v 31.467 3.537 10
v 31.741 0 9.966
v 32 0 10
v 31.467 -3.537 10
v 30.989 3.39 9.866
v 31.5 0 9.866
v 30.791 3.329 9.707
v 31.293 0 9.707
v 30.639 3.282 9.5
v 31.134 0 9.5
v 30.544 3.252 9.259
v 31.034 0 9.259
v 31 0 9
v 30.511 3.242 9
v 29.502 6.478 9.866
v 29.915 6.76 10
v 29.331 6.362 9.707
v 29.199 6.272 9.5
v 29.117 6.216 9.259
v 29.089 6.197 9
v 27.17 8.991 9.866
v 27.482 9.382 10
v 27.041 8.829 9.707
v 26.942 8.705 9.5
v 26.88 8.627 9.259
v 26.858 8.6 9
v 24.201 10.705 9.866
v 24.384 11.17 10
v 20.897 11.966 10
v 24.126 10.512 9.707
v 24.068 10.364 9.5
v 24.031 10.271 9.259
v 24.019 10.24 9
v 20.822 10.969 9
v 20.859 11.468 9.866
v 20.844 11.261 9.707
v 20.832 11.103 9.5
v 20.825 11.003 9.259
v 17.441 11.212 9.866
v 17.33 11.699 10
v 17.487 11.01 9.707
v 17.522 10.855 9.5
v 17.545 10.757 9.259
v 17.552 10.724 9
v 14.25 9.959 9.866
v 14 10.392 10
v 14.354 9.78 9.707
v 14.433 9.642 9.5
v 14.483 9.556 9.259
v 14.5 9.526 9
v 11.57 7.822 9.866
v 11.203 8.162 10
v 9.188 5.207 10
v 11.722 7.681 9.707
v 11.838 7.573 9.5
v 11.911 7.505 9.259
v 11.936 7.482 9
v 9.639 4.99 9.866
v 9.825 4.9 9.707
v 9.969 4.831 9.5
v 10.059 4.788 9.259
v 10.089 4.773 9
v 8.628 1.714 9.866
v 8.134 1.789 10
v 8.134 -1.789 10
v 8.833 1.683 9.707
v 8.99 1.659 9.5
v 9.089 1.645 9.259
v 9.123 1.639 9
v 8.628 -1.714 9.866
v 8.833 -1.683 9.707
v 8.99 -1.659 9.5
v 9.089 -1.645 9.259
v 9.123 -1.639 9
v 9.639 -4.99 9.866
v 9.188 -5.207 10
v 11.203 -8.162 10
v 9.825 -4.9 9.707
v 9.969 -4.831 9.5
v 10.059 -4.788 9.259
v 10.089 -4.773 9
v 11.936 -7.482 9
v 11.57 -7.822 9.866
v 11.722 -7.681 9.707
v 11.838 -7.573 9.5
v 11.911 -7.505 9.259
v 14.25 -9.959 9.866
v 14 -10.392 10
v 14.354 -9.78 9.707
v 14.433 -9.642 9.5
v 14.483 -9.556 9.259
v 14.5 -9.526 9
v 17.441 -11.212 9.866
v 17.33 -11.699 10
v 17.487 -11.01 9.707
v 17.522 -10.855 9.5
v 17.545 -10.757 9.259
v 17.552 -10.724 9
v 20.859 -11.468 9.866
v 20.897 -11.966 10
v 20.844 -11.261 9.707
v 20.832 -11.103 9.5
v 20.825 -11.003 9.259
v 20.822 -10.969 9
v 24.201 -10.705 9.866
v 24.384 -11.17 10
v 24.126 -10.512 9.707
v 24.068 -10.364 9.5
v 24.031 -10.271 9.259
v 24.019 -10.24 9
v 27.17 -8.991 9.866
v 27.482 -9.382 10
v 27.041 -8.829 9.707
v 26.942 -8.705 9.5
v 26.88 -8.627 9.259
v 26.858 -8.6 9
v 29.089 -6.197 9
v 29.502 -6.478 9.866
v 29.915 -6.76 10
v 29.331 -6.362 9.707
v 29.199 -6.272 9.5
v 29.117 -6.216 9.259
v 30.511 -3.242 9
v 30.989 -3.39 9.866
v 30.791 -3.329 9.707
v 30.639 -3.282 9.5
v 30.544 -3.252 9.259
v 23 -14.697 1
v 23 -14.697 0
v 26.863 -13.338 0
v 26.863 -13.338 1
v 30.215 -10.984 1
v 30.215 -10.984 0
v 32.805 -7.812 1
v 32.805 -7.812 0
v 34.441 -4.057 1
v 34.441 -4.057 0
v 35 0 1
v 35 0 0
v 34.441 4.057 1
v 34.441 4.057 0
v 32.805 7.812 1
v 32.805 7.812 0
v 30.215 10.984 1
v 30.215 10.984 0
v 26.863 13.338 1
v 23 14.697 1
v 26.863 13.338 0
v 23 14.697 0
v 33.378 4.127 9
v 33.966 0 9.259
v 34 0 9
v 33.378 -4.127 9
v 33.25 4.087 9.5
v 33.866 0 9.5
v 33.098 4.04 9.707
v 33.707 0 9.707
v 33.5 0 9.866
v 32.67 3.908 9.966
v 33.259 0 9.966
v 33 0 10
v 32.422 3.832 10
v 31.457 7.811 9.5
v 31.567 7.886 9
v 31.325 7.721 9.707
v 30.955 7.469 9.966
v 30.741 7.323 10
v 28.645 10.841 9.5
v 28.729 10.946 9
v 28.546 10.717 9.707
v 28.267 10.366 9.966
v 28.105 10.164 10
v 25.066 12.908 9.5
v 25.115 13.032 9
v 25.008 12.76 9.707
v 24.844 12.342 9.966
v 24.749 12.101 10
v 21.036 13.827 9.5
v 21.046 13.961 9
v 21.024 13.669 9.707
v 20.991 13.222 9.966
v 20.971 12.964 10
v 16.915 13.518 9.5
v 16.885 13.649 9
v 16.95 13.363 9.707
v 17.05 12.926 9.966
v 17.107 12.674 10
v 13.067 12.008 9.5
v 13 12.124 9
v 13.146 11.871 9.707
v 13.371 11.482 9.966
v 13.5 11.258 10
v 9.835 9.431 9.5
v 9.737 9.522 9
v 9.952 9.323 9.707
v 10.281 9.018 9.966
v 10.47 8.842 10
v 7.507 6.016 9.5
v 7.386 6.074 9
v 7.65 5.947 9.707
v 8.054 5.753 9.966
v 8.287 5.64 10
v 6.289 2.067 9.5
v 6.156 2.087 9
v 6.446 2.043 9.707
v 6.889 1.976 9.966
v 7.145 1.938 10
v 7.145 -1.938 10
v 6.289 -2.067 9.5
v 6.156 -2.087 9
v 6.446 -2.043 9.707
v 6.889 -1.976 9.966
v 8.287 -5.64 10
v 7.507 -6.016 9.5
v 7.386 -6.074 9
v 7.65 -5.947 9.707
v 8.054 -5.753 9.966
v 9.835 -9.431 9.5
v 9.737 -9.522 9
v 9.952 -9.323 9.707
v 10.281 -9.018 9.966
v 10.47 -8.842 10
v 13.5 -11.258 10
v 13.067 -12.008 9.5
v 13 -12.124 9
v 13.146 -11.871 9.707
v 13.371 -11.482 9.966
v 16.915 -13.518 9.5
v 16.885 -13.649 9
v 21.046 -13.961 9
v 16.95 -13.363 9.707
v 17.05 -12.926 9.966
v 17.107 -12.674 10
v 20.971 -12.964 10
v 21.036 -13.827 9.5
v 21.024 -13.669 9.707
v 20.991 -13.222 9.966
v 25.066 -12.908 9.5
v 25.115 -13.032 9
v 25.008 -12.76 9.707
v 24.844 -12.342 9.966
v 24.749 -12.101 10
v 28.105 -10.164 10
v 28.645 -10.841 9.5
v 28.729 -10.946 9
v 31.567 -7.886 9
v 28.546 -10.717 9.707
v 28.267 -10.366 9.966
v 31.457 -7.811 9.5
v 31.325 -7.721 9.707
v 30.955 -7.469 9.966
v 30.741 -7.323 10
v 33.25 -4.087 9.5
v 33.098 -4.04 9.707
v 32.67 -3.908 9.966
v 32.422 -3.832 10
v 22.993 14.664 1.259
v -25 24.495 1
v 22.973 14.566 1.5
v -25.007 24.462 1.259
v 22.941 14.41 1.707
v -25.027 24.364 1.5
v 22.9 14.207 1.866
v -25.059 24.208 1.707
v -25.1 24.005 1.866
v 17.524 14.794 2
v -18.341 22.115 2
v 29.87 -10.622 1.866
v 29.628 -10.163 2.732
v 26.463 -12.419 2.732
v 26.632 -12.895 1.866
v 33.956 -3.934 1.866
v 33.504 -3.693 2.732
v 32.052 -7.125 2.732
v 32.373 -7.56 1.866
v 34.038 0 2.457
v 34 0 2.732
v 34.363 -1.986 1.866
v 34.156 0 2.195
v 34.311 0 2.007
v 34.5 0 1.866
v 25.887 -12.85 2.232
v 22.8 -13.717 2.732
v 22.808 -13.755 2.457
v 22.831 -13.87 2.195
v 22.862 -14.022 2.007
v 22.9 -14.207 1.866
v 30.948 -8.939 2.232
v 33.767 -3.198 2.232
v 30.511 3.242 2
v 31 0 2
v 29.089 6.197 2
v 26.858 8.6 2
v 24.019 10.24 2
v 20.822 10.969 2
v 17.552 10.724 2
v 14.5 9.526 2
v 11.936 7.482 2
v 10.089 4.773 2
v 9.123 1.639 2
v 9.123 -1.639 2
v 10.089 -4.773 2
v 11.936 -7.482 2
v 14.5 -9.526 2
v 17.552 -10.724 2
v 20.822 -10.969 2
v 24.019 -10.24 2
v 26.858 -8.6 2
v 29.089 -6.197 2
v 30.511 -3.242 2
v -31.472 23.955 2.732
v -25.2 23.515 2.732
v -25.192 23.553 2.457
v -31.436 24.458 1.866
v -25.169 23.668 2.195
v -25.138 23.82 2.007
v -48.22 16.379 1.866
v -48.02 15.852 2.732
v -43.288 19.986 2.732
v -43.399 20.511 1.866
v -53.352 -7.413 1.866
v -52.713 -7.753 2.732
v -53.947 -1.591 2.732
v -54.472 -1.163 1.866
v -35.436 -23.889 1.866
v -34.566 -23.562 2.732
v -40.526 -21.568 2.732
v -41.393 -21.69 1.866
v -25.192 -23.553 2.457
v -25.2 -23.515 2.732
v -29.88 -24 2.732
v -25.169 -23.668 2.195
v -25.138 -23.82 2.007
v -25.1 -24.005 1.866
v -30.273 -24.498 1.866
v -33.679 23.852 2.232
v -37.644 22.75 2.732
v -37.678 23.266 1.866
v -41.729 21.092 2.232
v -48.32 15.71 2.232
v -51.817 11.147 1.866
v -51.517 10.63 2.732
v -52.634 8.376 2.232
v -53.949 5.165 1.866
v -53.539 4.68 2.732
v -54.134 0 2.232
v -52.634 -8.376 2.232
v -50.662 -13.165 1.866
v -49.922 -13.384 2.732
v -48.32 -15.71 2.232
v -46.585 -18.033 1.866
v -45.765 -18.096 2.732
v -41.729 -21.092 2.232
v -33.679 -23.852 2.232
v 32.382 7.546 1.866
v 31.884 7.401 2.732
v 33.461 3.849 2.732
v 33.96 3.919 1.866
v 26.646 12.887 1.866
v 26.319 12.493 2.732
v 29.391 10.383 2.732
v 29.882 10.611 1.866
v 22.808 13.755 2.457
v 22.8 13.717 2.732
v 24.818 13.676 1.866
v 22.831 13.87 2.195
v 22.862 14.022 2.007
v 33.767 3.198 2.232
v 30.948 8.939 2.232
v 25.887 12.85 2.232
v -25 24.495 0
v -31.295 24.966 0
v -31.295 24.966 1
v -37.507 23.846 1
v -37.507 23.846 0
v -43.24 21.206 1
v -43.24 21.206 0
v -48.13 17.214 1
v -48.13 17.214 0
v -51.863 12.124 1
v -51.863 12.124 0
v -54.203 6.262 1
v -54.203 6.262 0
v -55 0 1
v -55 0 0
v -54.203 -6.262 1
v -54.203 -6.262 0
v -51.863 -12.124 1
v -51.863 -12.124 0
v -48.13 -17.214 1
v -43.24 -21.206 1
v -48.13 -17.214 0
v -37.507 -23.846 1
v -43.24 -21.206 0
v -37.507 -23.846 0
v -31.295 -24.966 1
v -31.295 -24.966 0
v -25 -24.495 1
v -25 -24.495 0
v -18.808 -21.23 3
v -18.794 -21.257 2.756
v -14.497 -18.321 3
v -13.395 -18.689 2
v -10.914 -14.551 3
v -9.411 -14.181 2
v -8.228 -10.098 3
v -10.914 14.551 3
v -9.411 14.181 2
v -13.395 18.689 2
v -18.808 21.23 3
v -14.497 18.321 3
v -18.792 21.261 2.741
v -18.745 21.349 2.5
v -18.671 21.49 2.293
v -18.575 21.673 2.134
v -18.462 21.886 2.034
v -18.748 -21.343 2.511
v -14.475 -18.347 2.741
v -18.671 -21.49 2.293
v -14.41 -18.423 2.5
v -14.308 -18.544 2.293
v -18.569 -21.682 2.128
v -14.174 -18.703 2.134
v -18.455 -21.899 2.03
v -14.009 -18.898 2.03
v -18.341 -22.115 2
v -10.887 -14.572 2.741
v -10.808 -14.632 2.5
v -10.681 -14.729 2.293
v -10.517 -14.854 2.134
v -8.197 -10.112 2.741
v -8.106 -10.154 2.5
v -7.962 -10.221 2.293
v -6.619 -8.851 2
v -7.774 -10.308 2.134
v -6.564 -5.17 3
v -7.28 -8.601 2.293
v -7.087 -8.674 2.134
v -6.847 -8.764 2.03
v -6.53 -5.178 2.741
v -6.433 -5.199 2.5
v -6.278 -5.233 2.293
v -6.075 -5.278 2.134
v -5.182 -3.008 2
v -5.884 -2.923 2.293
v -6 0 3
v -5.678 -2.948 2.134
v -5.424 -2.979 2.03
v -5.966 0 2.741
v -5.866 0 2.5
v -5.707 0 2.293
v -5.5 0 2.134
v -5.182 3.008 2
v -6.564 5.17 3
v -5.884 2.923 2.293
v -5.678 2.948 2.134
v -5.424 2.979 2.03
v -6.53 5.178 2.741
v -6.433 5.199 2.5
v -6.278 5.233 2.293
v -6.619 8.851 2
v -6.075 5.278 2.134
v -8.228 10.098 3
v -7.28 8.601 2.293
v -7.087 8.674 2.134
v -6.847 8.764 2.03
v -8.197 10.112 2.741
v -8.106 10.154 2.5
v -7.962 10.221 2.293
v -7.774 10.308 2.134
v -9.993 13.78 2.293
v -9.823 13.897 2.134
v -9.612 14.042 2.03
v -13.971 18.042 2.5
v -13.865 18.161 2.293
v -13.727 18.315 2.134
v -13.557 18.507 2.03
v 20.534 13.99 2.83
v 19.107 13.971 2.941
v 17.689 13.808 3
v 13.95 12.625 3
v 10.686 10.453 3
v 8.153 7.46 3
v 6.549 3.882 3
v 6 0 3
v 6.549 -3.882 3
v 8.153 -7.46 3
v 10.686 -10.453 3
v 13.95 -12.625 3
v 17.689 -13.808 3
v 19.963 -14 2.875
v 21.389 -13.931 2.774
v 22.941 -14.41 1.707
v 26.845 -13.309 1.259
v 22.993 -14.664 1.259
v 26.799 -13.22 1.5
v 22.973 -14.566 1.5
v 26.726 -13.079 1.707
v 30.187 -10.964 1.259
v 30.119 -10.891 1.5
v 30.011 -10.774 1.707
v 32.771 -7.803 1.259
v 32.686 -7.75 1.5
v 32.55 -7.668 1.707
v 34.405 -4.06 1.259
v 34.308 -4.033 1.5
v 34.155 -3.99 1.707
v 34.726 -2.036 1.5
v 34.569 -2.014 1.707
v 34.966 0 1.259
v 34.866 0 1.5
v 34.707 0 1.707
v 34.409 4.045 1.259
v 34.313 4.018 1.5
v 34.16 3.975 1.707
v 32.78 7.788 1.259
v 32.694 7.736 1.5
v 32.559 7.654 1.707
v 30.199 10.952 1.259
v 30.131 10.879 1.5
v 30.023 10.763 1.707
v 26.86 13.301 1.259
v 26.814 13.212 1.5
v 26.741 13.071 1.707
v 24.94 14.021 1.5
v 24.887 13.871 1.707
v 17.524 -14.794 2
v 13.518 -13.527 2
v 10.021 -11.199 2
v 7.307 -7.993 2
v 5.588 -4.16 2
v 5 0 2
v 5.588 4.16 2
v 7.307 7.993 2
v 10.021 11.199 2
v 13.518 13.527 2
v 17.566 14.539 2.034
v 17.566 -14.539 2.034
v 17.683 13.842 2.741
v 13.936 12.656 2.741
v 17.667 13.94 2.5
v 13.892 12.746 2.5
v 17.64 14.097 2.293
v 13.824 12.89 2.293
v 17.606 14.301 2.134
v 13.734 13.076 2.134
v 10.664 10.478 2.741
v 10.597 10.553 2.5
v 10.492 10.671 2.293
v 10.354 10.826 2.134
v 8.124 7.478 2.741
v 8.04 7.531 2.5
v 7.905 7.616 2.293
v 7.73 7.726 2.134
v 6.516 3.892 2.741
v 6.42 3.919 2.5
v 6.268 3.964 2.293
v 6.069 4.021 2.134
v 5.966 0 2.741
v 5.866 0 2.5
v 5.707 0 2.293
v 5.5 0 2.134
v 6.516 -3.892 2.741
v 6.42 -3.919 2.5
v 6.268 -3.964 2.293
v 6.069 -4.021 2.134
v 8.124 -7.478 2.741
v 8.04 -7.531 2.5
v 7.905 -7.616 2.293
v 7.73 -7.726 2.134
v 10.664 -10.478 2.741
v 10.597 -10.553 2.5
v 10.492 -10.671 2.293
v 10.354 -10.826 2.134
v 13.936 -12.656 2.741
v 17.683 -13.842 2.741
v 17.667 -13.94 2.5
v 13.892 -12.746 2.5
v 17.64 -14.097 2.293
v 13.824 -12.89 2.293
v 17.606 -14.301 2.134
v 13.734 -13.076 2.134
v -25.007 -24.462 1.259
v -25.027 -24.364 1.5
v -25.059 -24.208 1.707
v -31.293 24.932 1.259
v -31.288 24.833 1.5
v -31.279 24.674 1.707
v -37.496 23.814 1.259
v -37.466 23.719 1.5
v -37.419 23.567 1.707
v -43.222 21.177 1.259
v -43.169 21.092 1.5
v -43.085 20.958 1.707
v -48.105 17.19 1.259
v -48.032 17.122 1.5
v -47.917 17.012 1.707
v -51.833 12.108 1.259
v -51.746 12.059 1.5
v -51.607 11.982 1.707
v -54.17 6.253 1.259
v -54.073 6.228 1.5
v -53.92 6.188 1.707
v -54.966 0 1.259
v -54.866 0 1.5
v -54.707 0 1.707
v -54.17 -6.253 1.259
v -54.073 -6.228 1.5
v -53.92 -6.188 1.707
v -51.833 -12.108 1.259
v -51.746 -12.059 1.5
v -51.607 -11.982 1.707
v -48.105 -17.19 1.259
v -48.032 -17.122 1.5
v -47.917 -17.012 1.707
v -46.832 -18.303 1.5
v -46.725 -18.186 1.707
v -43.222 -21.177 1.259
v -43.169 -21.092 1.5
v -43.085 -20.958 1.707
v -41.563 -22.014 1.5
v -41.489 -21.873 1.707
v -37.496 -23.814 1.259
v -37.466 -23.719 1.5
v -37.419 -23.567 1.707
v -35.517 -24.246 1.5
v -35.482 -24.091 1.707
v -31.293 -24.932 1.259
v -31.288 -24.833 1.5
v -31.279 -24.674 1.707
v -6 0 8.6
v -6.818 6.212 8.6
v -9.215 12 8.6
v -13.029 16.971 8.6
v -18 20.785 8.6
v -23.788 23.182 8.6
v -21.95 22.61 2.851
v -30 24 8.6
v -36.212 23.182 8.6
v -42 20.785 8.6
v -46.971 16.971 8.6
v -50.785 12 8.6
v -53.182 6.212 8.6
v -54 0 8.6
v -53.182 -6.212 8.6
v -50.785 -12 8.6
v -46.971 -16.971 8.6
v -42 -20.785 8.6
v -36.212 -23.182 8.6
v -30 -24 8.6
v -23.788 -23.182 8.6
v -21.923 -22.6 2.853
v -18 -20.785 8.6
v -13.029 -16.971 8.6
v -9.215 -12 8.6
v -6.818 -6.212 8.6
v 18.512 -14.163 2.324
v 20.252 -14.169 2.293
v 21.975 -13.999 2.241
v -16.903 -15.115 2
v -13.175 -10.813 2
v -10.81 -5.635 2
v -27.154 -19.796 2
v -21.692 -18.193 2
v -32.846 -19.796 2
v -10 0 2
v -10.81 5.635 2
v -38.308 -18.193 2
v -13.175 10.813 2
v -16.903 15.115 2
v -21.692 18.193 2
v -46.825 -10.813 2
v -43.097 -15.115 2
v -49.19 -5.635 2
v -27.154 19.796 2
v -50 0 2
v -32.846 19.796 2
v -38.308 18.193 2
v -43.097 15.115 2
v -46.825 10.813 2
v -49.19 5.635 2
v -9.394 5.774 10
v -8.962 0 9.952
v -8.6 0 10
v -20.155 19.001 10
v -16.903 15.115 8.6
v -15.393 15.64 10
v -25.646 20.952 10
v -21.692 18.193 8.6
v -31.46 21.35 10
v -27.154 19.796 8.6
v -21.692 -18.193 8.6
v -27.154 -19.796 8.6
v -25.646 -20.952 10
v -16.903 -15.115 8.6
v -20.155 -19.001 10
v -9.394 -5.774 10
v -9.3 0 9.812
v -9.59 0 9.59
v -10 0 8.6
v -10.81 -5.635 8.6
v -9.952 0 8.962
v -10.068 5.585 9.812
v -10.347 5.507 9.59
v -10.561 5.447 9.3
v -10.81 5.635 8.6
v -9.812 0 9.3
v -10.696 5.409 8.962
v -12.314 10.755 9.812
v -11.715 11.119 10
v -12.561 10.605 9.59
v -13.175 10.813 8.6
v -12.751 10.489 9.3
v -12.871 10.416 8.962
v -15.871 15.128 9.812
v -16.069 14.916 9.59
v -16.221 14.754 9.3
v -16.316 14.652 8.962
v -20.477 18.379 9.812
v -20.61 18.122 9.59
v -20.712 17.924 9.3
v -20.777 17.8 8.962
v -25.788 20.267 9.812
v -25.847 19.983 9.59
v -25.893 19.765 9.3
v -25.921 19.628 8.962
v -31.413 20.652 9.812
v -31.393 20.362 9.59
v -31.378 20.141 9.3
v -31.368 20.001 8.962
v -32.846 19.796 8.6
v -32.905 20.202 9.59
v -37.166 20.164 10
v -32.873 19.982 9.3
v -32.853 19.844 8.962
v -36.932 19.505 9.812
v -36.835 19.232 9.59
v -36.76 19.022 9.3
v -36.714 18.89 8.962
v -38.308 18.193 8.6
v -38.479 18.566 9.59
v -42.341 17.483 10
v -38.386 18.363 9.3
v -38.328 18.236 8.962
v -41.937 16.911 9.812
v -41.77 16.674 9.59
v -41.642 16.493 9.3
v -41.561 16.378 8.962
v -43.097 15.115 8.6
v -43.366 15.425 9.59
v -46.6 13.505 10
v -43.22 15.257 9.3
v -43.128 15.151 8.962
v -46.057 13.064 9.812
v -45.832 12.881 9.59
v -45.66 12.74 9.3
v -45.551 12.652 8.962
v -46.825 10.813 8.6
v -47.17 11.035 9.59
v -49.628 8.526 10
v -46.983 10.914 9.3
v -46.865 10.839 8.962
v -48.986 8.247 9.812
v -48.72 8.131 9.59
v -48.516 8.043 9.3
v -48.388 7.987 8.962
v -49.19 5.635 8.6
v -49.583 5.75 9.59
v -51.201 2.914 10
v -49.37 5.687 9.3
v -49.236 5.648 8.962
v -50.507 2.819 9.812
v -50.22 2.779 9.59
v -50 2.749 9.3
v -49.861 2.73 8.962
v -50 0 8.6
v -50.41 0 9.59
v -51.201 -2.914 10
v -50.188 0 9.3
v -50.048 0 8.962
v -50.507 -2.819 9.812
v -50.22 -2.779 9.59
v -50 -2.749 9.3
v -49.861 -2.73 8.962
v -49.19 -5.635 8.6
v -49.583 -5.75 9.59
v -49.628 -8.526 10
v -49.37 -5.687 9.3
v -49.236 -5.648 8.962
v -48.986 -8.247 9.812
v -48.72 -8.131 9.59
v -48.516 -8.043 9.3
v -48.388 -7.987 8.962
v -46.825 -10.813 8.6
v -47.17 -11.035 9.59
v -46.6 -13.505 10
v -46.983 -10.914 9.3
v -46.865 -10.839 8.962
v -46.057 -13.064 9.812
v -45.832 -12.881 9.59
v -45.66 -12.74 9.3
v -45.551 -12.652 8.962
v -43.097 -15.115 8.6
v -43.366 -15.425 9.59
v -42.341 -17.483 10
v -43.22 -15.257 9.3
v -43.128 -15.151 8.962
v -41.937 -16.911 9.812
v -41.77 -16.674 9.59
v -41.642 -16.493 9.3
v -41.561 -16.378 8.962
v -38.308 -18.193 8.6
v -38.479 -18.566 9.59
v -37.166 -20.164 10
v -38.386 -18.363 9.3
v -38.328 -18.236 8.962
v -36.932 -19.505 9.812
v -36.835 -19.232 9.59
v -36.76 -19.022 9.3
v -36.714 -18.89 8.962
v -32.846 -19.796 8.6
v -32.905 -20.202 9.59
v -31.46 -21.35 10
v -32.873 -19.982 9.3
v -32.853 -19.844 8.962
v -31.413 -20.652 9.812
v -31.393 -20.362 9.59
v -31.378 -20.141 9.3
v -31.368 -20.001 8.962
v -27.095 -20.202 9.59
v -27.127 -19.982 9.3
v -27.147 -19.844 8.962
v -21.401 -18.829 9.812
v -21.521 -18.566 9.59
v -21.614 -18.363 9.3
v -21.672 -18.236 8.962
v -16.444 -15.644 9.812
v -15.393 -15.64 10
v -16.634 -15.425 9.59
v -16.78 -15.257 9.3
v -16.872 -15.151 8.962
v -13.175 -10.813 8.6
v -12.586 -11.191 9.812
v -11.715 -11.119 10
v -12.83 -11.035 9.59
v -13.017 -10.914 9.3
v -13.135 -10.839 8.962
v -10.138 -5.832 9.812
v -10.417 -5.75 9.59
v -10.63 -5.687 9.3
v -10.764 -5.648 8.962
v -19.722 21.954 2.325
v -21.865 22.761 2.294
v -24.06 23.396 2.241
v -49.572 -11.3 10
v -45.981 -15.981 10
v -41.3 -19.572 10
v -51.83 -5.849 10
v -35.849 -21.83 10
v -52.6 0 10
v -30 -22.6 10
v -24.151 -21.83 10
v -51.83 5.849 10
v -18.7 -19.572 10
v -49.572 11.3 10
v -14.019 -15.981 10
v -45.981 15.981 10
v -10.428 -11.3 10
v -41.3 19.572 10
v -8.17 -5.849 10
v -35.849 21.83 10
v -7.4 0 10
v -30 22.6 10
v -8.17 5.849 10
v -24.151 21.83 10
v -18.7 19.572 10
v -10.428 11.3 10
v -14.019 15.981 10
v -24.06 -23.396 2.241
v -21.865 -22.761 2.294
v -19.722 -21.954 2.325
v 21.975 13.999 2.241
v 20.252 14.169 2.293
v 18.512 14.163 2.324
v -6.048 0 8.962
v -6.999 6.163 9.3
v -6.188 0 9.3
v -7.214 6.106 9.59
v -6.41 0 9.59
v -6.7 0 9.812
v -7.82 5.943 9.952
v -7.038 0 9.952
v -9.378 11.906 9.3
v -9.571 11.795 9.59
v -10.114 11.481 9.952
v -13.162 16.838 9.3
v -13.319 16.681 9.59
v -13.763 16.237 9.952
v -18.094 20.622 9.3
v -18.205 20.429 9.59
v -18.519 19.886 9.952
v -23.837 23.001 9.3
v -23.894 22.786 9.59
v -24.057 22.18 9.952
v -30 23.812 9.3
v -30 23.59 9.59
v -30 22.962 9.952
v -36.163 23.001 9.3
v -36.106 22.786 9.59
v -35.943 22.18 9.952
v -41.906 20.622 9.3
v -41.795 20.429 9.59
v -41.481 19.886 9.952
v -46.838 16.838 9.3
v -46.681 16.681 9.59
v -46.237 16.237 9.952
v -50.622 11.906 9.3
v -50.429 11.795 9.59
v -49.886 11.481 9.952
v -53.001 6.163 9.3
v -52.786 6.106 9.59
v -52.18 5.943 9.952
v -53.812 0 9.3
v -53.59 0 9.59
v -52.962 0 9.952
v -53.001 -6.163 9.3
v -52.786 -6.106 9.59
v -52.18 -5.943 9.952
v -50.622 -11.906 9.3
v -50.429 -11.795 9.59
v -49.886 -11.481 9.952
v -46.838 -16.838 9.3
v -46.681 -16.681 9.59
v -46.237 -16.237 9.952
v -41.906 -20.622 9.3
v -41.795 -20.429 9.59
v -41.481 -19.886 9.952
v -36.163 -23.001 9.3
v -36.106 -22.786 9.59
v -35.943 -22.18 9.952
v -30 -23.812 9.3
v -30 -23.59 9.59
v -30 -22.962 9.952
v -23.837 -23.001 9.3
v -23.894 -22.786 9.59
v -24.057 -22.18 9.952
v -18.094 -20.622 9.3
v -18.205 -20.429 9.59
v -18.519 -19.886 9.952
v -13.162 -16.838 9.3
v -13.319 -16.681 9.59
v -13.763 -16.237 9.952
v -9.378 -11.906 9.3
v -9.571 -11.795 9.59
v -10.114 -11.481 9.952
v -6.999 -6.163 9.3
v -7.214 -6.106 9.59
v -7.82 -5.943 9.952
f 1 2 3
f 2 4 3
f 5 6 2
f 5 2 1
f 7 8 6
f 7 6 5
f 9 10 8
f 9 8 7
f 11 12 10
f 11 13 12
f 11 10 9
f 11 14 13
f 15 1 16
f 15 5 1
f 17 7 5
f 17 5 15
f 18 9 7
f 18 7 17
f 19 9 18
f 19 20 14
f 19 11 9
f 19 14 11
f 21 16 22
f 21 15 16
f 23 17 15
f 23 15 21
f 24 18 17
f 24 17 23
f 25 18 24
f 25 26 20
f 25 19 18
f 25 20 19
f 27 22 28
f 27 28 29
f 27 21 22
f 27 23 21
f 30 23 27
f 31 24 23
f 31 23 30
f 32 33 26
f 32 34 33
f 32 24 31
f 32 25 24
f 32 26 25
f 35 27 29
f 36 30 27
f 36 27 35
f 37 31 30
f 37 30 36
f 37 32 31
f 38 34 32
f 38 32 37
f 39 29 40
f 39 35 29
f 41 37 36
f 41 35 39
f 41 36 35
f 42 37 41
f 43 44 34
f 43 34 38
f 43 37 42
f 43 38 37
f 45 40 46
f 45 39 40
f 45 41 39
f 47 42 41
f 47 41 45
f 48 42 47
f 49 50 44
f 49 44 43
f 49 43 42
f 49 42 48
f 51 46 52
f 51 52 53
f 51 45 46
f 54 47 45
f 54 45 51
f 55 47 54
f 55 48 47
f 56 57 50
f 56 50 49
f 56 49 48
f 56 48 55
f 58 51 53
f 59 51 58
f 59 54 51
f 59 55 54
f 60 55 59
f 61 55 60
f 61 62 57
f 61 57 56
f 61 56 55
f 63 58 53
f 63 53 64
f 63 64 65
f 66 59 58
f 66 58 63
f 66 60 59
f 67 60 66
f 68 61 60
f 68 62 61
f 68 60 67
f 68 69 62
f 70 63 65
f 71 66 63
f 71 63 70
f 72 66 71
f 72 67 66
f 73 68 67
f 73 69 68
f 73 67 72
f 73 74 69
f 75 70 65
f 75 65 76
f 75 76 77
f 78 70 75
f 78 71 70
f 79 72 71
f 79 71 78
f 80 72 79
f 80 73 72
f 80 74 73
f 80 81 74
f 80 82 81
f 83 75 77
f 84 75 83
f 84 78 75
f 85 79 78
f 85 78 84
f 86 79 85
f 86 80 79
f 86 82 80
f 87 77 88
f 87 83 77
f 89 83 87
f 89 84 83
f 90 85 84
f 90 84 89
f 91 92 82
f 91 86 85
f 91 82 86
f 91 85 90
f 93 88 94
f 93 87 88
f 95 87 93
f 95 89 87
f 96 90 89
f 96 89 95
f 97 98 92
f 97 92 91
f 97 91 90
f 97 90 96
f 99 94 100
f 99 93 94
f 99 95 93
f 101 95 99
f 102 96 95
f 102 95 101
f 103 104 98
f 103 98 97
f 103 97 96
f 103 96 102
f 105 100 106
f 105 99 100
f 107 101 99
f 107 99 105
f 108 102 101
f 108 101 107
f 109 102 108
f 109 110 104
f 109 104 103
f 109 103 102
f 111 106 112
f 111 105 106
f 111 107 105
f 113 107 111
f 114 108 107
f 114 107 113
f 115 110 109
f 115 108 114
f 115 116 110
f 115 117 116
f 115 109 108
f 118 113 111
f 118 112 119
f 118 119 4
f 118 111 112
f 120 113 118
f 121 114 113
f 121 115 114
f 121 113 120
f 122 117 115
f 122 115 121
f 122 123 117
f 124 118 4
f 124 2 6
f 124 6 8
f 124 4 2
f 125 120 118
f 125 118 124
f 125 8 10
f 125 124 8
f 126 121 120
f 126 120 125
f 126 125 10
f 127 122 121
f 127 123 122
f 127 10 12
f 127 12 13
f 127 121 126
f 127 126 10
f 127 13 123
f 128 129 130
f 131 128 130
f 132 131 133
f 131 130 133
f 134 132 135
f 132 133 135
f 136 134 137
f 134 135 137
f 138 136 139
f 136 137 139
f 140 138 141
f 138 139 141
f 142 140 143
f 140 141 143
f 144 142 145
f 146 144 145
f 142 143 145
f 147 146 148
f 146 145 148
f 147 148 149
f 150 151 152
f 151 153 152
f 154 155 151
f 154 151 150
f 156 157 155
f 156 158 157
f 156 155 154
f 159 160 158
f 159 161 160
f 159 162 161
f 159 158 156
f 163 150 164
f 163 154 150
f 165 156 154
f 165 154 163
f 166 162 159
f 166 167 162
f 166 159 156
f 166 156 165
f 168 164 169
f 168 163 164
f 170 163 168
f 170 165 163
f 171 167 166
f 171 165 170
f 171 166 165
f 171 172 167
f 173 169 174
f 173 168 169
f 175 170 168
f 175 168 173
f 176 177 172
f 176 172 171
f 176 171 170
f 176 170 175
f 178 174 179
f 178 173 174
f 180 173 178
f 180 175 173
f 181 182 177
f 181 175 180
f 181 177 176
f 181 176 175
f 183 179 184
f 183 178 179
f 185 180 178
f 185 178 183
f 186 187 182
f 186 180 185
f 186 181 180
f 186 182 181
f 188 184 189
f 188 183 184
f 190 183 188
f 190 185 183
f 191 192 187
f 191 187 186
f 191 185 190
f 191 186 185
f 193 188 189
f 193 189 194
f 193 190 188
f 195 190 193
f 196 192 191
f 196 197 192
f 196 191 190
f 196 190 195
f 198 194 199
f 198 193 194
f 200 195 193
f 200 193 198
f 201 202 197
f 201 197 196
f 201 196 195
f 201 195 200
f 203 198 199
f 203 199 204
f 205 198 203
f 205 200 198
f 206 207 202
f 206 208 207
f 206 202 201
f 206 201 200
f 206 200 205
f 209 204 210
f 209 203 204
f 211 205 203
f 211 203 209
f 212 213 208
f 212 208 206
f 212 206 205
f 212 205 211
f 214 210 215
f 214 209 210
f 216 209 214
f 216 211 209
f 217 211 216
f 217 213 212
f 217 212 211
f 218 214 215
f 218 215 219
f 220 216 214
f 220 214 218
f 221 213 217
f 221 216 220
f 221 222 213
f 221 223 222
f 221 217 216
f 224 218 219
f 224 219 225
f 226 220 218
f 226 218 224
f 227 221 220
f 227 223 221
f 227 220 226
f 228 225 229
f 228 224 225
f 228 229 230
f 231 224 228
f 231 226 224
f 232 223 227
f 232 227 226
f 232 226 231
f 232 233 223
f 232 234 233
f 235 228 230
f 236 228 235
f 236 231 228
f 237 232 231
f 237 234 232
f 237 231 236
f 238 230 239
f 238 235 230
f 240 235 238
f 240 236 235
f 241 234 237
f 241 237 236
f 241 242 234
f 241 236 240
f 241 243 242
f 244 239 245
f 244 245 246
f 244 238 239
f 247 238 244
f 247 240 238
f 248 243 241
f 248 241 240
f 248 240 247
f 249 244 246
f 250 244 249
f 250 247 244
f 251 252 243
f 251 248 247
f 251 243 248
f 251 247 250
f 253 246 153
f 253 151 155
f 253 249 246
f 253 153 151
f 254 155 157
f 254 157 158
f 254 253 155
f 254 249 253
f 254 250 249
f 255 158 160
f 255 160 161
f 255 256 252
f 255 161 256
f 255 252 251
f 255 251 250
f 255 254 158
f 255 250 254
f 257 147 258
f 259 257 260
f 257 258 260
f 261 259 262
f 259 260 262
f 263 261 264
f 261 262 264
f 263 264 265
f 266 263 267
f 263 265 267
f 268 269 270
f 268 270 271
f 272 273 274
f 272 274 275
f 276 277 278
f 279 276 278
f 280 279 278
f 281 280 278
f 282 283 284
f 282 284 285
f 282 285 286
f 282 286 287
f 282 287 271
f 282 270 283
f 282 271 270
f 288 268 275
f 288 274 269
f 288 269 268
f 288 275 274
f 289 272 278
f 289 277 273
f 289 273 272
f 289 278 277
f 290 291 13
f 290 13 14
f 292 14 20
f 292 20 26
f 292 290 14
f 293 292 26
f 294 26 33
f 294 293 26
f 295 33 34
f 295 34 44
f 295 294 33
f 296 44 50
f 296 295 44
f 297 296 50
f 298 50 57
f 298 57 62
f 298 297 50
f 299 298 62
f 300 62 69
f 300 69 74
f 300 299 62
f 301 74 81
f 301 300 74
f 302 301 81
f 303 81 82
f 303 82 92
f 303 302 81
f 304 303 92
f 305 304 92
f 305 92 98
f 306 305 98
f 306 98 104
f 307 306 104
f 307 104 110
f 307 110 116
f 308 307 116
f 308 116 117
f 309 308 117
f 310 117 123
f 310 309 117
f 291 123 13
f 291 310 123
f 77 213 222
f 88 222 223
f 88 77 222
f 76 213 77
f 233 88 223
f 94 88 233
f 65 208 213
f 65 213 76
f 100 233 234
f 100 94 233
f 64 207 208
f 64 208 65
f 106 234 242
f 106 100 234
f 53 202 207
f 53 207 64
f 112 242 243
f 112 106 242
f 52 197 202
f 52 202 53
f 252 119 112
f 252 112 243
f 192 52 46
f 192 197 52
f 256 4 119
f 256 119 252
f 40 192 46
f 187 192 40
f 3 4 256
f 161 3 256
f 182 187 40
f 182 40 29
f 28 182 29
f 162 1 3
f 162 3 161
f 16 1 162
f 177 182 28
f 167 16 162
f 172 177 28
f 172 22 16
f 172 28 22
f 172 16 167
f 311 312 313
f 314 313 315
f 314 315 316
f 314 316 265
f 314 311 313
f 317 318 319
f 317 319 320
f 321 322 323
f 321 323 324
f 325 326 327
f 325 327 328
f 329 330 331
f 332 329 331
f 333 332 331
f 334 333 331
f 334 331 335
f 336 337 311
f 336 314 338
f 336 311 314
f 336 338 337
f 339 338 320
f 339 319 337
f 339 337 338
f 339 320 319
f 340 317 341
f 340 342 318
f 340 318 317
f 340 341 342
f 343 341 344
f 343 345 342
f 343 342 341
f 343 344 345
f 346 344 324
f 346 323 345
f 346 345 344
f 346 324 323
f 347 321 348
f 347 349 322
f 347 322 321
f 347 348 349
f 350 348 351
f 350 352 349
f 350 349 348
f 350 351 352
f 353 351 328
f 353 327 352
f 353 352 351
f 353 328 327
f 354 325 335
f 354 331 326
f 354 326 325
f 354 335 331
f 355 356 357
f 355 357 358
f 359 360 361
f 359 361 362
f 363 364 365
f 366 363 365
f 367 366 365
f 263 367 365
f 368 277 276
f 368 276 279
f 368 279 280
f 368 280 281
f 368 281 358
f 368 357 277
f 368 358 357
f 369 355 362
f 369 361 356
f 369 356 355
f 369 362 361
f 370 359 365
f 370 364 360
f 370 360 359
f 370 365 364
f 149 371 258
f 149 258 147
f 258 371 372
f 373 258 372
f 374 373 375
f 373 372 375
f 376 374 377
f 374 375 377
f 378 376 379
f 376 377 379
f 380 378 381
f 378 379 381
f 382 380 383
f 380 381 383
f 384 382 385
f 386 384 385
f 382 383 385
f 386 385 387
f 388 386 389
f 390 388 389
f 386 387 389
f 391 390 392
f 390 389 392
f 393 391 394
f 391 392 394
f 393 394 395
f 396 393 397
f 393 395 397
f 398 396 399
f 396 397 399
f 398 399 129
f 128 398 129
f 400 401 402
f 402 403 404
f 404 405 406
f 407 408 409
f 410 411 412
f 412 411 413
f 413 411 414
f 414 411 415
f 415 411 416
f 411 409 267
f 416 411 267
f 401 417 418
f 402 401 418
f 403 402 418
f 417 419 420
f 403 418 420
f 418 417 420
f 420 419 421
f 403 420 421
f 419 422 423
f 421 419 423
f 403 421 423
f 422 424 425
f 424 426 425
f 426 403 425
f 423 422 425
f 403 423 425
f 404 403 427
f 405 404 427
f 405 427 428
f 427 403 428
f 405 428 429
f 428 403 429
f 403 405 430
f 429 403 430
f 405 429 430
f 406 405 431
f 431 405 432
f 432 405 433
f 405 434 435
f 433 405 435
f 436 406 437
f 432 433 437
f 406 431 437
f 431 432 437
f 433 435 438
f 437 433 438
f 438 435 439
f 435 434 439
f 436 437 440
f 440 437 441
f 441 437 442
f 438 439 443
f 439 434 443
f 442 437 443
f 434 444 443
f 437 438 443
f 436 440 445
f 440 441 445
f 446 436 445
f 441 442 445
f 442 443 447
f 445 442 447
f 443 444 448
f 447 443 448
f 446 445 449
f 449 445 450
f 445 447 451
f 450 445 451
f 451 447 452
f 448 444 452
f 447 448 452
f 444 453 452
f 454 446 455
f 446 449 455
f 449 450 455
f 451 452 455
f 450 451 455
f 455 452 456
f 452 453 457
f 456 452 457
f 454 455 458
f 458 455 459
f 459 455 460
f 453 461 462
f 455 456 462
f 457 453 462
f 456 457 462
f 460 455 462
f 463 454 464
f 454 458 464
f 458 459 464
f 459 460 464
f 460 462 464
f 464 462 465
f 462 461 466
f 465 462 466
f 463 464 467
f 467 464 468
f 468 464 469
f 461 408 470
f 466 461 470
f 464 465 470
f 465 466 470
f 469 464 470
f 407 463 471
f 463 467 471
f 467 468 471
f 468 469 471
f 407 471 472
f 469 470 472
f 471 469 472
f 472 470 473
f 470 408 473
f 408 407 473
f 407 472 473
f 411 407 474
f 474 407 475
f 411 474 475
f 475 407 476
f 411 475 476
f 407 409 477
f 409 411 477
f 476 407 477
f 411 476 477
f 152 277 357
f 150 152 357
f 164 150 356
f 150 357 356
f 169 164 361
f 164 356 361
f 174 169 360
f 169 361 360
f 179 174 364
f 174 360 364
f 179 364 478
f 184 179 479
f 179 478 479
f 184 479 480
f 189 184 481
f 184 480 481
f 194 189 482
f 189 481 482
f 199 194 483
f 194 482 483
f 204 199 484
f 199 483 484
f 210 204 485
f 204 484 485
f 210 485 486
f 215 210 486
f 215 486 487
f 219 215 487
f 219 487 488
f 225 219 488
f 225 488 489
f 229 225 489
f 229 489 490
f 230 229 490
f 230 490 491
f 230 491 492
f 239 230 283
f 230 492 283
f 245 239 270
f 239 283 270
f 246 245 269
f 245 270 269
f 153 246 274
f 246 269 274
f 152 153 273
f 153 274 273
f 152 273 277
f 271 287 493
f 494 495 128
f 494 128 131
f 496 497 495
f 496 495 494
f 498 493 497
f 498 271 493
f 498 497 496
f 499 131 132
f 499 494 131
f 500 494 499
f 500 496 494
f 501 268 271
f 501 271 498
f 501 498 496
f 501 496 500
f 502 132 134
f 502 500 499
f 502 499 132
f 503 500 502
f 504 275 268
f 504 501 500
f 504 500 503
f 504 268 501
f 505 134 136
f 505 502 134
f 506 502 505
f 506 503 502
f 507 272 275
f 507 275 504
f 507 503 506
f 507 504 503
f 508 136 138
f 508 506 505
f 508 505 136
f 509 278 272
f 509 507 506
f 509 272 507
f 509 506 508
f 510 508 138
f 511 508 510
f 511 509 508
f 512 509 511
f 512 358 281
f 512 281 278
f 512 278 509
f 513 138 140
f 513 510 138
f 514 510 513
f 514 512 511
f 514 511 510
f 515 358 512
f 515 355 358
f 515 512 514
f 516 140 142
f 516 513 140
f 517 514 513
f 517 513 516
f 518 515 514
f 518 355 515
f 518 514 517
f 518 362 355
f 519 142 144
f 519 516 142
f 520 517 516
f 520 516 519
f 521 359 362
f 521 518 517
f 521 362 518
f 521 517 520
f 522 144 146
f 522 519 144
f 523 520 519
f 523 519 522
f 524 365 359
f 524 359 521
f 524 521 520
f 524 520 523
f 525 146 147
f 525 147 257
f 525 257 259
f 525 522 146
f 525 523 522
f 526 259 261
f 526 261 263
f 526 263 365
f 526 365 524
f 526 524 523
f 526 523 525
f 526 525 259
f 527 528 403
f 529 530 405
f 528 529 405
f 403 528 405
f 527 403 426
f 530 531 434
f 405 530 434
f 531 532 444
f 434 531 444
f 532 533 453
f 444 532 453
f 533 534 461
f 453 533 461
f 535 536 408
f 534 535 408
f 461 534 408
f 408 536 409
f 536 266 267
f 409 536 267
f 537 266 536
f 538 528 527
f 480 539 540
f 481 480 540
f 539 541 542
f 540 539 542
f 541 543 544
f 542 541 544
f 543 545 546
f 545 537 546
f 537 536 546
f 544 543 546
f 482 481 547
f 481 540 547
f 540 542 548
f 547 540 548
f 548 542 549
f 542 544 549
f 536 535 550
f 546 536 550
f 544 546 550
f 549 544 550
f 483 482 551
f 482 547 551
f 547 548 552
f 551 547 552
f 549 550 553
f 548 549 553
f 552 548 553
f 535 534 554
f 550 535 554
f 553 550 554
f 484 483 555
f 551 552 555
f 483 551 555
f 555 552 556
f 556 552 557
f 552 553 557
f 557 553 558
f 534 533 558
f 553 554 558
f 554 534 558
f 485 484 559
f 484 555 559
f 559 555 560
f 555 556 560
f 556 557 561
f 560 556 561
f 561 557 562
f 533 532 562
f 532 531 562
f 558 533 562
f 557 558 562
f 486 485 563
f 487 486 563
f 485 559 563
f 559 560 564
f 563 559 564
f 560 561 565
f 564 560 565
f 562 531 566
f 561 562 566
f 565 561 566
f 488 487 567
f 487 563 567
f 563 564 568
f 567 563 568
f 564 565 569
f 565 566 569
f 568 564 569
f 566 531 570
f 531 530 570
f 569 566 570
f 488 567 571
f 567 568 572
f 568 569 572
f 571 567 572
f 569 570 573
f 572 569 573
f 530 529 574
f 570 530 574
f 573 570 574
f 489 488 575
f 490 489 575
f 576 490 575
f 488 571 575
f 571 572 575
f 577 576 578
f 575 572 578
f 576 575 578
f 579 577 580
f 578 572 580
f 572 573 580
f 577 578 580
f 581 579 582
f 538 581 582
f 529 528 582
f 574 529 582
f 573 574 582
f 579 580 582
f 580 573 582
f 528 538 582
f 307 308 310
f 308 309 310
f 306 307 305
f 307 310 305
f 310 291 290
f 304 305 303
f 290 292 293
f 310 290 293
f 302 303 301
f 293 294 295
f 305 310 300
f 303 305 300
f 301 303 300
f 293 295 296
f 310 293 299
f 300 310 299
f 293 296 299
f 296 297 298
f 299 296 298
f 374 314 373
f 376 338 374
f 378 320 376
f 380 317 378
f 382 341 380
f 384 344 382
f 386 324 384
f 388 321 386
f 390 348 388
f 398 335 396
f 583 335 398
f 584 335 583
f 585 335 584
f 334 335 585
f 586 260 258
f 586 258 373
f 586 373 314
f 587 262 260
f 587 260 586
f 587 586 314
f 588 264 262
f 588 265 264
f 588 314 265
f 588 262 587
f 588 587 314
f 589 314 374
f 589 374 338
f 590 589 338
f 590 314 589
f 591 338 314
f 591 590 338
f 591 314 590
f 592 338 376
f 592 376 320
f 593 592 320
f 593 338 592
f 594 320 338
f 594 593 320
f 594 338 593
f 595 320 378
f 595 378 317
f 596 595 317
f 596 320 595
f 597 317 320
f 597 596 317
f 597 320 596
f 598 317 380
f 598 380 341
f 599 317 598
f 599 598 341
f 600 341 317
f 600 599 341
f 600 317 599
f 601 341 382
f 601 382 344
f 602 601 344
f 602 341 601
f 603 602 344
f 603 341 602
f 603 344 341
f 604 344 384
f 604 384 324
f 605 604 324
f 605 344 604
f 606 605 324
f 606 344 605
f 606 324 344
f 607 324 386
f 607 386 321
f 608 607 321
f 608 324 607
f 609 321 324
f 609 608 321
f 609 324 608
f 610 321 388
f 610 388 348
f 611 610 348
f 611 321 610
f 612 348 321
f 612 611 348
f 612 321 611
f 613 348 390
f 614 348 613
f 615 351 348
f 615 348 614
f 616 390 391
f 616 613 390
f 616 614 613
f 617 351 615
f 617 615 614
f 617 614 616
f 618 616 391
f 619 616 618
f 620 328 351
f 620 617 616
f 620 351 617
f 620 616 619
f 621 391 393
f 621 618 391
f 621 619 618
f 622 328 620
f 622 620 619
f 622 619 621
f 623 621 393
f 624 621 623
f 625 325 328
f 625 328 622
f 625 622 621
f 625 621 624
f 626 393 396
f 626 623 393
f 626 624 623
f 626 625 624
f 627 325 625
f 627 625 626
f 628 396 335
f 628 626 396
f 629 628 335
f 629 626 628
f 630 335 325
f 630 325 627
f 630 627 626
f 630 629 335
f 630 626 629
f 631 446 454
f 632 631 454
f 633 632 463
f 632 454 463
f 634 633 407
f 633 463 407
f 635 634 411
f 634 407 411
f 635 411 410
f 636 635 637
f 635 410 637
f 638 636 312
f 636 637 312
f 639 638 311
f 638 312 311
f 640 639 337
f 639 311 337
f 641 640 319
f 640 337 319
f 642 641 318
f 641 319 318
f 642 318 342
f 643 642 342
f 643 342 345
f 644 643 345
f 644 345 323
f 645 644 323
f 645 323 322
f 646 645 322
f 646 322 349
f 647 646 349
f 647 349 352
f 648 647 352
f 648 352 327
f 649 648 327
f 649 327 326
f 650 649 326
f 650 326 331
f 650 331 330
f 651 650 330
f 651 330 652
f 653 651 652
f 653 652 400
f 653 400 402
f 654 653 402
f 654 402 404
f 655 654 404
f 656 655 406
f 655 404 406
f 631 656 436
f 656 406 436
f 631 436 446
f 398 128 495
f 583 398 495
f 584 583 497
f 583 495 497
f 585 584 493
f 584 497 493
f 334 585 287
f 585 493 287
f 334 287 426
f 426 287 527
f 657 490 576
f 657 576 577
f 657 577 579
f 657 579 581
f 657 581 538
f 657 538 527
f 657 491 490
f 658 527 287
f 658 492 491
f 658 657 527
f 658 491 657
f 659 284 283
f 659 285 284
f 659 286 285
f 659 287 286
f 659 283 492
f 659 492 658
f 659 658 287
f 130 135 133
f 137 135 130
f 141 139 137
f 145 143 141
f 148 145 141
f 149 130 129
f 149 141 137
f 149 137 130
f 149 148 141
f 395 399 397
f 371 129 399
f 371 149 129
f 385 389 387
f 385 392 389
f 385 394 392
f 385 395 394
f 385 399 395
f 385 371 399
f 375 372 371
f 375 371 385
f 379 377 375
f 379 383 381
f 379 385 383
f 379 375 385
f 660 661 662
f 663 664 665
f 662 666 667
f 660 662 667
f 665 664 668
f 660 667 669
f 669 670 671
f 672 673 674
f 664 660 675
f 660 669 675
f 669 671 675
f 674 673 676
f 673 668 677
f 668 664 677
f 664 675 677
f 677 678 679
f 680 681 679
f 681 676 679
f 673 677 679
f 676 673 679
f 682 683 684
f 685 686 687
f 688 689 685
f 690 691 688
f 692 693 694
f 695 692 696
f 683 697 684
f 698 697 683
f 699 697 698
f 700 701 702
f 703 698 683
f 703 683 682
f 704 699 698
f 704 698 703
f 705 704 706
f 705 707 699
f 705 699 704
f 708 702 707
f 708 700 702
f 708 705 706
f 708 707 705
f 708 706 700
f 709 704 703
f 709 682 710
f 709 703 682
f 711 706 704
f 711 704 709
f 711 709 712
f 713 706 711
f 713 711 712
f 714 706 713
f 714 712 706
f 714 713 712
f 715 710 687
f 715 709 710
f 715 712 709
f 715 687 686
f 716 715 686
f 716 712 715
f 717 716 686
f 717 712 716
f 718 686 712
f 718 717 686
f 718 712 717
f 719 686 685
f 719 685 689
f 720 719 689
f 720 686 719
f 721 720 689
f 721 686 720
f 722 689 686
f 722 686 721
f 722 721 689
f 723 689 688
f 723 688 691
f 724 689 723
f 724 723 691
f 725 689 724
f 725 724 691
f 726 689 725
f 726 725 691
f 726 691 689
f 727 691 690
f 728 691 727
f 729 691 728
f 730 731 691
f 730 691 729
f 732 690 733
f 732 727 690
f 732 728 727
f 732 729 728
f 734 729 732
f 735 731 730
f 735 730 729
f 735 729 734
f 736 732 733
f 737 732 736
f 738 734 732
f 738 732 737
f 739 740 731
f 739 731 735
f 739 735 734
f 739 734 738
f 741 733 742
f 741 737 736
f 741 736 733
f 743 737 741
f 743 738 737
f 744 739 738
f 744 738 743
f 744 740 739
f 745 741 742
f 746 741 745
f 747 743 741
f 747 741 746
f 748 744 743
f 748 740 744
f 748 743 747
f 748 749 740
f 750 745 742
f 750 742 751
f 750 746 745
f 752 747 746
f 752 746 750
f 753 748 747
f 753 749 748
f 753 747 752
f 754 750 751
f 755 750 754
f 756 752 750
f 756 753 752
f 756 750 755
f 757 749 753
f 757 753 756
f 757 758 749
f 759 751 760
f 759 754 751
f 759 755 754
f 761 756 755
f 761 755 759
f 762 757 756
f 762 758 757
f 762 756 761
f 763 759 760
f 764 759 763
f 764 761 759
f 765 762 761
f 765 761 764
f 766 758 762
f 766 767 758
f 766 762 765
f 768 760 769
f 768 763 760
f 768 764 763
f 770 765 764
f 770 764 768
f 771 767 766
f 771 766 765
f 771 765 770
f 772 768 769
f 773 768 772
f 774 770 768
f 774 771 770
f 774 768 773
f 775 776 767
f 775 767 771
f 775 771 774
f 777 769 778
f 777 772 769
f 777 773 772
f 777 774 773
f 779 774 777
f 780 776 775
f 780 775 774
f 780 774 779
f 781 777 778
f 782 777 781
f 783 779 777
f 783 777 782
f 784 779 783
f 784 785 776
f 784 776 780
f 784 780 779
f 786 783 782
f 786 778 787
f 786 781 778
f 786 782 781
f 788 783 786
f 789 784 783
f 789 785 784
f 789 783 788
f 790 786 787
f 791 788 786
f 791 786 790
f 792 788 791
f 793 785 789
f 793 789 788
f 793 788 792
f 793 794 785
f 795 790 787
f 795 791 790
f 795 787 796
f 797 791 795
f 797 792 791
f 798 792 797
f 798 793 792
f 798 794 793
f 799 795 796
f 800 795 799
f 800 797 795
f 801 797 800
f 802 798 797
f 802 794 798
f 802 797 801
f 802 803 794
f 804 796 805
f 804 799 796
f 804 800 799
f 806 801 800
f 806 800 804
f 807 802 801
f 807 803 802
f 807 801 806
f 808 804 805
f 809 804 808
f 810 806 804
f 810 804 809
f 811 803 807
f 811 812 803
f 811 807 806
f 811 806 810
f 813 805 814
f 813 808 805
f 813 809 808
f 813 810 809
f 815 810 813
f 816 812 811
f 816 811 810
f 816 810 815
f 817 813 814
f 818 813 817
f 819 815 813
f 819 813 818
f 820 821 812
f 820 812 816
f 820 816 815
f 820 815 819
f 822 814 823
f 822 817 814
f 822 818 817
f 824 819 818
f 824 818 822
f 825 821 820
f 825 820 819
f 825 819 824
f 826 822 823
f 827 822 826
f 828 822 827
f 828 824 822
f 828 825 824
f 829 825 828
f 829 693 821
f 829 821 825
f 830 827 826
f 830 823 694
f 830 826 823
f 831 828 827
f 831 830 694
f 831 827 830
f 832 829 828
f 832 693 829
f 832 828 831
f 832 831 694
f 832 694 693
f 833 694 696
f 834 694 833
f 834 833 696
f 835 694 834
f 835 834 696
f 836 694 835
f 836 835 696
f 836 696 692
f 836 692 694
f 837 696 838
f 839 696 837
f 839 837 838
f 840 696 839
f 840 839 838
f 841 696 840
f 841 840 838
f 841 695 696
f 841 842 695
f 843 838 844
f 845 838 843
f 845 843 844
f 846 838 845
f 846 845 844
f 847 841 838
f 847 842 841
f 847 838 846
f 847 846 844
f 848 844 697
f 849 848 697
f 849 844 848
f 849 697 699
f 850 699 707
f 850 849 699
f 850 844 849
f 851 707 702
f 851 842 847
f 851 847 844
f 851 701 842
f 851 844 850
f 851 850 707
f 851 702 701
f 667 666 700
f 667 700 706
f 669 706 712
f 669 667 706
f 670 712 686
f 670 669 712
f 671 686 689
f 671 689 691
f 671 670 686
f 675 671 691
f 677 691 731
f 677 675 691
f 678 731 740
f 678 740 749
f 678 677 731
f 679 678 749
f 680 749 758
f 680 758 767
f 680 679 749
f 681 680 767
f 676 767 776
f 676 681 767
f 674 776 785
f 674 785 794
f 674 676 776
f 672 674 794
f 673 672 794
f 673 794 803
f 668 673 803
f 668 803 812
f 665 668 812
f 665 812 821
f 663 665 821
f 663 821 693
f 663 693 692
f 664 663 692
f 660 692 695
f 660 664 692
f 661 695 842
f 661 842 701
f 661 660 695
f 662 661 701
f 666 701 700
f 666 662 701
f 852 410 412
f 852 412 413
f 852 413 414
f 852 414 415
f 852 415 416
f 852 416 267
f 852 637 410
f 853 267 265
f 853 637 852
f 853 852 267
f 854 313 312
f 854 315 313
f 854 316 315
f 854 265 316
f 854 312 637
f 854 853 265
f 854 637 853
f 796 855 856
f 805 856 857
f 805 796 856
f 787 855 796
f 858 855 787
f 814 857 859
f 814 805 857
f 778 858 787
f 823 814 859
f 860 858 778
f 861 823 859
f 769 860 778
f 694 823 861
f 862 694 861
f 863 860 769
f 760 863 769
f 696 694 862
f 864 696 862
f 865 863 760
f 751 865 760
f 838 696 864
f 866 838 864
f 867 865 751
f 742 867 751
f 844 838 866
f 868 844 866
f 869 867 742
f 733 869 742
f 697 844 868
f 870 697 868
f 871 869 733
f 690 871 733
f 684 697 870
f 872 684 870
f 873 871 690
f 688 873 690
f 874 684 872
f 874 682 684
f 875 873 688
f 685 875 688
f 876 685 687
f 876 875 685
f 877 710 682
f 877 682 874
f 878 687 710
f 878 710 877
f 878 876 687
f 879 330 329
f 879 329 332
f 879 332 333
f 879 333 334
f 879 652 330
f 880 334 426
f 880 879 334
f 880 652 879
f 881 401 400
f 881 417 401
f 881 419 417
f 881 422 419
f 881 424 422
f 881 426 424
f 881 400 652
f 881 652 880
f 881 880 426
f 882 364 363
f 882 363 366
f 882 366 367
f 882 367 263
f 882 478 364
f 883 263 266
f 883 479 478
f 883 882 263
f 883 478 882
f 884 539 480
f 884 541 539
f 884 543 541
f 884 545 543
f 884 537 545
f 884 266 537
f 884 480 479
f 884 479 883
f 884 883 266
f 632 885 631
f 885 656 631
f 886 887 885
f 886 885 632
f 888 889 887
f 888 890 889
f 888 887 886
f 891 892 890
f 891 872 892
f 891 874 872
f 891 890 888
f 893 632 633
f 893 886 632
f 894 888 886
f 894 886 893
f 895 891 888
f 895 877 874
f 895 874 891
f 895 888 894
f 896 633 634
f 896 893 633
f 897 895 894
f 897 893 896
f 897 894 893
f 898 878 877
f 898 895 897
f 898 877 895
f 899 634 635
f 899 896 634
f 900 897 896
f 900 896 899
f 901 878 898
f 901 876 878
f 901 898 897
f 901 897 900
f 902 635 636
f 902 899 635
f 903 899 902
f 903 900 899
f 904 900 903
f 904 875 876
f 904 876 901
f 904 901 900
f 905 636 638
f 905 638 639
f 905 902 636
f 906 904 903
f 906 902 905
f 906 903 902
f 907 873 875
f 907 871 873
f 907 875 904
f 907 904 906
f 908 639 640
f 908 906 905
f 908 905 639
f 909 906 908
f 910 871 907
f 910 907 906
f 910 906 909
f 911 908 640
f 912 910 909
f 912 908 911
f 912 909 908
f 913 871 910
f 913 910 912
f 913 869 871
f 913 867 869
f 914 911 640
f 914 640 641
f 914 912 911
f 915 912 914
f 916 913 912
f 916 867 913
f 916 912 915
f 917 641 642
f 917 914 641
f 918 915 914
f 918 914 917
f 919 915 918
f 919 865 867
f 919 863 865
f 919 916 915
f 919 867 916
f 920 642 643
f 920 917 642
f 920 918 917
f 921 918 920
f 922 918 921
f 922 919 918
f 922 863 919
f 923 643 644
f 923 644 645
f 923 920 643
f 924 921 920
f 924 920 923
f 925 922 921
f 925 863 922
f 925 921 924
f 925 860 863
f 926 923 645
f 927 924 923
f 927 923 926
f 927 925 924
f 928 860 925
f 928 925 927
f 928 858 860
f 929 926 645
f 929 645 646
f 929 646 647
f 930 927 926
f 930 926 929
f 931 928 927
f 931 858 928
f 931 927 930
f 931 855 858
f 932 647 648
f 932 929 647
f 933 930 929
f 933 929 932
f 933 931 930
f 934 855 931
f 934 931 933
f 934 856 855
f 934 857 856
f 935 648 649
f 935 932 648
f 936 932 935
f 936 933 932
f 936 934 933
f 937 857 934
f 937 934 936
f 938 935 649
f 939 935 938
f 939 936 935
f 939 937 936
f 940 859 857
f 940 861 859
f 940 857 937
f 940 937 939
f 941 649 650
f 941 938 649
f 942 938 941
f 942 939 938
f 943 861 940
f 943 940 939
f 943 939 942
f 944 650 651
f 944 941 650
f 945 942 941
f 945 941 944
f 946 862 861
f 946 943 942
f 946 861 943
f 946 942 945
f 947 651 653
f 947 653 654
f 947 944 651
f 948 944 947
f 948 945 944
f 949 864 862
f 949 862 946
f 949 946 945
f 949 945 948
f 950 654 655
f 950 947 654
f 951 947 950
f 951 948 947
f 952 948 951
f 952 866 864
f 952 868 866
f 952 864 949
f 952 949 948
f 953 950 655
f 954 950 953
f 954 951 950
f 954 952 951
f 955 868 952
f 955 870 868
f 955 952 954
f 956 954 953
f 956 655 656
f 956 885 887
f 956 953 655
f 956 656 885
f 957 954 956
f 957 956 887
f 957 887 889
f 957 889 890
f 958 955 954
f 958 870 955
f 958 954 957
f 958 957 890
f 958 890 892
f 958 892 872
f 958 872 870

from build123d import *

# Parameters (mm, degrees)
PAD_DEPTH     = 2
FILLET_R      = 1
SKETCH001_R   = 24
SKETCH001_R_2 = 20
SKETCH001_R_3 = 14
SKETCH001_R_4 = 11
PAD001_DEPTH  = 8
FILLET001_R   = 1
FILLET002_R   = 1
FILLET003_R   = 1.4
FILLET004_R   = 1


with BuildPart() as part:
    # Sketch → Pad (new body)
    with BuildSketch(Plane.XY):
        with BuildLine():
            Line((-25.000041, 24.494906), (22.999975, 14.696943))
            ThreePointArc((22.999975, -14.696943), (35, 0), (22.999975, 14.696943))
            Line((-25.000041, -24.494906), (22.999975, -14.696943))
            ThreePointArc((-25.000041, 24.494906), (-55, 0), (-25.000041, -24.494906))
        make_face()
    extrude(amount=PAD_DEPTH)

    # Fillet
    fillet_edges = [part.edges().sort_by_distance(p)[0] for p in [
        (-55, 0, 2),
        (-1.000033, -19.595925, 2),
        (35, 0, 2),
        (-1.000033, 19.595925, 2),
    ]]
    fillet(fillet_edges, radius=FILLET_R)

    # Sketch001 (on Face8 of Fillet) → Pad001 (join)
    with BuildSketch(Plane.XY.offset(2)):
        with Locations((-30, 0)):
            Circle(SKETCH001_R)
        with Locations((-30, 0)):
            Circle(SKETCH001_R_2, mode=Mode.SUBTRACT)
        with Locations((20, 0)):
            Circle(SKETCH001_R_3)
        with Locations((20, 0)):
            Circle(SKETCH001_R_4, mode=Mode.SUBTRACT)
    extrude(amount=PAD001_DEPTH)

    # Fillet001
    fillet001_edges = [part.edges().sort_by_distance(p)[0] for p in [
        (-11.409692, 15.178948, 2),
        (-54, 0, 2),
        (-11.409692, -15.178948, 2),
    ]]
    fillet(fillet001_edges, radius=FILLET001_R)

    # Fillet002
    fillet002_edges = [part.edges().sort_by_distance(p)[0] for p in [
        (6, 1e-06, 2),
        (30.844346, 8.854387, 2),
        (30.844346, -8.854387, 2),
    ]]
    fillet(fillet002_edges, radius=FILLET002_R)

    # Fillet003
    fillet003_edges = [part.edges().sort_by_distance(p)[0] for p in [
        (-54, 0, 10),
        (-50, 0, 10),
    ]]
    fillet(fillet003_edges, radius=FILLET003_R)

    # Fillet004
    fillet004_edges = [part.edges().sort_by_distance(p)[0] for p in [
        (6, 0, 10),
        (9, 0, 10),
    ]]
    fillet(fillet004_edges, radius=FILLET004_R)


solid = part.part
